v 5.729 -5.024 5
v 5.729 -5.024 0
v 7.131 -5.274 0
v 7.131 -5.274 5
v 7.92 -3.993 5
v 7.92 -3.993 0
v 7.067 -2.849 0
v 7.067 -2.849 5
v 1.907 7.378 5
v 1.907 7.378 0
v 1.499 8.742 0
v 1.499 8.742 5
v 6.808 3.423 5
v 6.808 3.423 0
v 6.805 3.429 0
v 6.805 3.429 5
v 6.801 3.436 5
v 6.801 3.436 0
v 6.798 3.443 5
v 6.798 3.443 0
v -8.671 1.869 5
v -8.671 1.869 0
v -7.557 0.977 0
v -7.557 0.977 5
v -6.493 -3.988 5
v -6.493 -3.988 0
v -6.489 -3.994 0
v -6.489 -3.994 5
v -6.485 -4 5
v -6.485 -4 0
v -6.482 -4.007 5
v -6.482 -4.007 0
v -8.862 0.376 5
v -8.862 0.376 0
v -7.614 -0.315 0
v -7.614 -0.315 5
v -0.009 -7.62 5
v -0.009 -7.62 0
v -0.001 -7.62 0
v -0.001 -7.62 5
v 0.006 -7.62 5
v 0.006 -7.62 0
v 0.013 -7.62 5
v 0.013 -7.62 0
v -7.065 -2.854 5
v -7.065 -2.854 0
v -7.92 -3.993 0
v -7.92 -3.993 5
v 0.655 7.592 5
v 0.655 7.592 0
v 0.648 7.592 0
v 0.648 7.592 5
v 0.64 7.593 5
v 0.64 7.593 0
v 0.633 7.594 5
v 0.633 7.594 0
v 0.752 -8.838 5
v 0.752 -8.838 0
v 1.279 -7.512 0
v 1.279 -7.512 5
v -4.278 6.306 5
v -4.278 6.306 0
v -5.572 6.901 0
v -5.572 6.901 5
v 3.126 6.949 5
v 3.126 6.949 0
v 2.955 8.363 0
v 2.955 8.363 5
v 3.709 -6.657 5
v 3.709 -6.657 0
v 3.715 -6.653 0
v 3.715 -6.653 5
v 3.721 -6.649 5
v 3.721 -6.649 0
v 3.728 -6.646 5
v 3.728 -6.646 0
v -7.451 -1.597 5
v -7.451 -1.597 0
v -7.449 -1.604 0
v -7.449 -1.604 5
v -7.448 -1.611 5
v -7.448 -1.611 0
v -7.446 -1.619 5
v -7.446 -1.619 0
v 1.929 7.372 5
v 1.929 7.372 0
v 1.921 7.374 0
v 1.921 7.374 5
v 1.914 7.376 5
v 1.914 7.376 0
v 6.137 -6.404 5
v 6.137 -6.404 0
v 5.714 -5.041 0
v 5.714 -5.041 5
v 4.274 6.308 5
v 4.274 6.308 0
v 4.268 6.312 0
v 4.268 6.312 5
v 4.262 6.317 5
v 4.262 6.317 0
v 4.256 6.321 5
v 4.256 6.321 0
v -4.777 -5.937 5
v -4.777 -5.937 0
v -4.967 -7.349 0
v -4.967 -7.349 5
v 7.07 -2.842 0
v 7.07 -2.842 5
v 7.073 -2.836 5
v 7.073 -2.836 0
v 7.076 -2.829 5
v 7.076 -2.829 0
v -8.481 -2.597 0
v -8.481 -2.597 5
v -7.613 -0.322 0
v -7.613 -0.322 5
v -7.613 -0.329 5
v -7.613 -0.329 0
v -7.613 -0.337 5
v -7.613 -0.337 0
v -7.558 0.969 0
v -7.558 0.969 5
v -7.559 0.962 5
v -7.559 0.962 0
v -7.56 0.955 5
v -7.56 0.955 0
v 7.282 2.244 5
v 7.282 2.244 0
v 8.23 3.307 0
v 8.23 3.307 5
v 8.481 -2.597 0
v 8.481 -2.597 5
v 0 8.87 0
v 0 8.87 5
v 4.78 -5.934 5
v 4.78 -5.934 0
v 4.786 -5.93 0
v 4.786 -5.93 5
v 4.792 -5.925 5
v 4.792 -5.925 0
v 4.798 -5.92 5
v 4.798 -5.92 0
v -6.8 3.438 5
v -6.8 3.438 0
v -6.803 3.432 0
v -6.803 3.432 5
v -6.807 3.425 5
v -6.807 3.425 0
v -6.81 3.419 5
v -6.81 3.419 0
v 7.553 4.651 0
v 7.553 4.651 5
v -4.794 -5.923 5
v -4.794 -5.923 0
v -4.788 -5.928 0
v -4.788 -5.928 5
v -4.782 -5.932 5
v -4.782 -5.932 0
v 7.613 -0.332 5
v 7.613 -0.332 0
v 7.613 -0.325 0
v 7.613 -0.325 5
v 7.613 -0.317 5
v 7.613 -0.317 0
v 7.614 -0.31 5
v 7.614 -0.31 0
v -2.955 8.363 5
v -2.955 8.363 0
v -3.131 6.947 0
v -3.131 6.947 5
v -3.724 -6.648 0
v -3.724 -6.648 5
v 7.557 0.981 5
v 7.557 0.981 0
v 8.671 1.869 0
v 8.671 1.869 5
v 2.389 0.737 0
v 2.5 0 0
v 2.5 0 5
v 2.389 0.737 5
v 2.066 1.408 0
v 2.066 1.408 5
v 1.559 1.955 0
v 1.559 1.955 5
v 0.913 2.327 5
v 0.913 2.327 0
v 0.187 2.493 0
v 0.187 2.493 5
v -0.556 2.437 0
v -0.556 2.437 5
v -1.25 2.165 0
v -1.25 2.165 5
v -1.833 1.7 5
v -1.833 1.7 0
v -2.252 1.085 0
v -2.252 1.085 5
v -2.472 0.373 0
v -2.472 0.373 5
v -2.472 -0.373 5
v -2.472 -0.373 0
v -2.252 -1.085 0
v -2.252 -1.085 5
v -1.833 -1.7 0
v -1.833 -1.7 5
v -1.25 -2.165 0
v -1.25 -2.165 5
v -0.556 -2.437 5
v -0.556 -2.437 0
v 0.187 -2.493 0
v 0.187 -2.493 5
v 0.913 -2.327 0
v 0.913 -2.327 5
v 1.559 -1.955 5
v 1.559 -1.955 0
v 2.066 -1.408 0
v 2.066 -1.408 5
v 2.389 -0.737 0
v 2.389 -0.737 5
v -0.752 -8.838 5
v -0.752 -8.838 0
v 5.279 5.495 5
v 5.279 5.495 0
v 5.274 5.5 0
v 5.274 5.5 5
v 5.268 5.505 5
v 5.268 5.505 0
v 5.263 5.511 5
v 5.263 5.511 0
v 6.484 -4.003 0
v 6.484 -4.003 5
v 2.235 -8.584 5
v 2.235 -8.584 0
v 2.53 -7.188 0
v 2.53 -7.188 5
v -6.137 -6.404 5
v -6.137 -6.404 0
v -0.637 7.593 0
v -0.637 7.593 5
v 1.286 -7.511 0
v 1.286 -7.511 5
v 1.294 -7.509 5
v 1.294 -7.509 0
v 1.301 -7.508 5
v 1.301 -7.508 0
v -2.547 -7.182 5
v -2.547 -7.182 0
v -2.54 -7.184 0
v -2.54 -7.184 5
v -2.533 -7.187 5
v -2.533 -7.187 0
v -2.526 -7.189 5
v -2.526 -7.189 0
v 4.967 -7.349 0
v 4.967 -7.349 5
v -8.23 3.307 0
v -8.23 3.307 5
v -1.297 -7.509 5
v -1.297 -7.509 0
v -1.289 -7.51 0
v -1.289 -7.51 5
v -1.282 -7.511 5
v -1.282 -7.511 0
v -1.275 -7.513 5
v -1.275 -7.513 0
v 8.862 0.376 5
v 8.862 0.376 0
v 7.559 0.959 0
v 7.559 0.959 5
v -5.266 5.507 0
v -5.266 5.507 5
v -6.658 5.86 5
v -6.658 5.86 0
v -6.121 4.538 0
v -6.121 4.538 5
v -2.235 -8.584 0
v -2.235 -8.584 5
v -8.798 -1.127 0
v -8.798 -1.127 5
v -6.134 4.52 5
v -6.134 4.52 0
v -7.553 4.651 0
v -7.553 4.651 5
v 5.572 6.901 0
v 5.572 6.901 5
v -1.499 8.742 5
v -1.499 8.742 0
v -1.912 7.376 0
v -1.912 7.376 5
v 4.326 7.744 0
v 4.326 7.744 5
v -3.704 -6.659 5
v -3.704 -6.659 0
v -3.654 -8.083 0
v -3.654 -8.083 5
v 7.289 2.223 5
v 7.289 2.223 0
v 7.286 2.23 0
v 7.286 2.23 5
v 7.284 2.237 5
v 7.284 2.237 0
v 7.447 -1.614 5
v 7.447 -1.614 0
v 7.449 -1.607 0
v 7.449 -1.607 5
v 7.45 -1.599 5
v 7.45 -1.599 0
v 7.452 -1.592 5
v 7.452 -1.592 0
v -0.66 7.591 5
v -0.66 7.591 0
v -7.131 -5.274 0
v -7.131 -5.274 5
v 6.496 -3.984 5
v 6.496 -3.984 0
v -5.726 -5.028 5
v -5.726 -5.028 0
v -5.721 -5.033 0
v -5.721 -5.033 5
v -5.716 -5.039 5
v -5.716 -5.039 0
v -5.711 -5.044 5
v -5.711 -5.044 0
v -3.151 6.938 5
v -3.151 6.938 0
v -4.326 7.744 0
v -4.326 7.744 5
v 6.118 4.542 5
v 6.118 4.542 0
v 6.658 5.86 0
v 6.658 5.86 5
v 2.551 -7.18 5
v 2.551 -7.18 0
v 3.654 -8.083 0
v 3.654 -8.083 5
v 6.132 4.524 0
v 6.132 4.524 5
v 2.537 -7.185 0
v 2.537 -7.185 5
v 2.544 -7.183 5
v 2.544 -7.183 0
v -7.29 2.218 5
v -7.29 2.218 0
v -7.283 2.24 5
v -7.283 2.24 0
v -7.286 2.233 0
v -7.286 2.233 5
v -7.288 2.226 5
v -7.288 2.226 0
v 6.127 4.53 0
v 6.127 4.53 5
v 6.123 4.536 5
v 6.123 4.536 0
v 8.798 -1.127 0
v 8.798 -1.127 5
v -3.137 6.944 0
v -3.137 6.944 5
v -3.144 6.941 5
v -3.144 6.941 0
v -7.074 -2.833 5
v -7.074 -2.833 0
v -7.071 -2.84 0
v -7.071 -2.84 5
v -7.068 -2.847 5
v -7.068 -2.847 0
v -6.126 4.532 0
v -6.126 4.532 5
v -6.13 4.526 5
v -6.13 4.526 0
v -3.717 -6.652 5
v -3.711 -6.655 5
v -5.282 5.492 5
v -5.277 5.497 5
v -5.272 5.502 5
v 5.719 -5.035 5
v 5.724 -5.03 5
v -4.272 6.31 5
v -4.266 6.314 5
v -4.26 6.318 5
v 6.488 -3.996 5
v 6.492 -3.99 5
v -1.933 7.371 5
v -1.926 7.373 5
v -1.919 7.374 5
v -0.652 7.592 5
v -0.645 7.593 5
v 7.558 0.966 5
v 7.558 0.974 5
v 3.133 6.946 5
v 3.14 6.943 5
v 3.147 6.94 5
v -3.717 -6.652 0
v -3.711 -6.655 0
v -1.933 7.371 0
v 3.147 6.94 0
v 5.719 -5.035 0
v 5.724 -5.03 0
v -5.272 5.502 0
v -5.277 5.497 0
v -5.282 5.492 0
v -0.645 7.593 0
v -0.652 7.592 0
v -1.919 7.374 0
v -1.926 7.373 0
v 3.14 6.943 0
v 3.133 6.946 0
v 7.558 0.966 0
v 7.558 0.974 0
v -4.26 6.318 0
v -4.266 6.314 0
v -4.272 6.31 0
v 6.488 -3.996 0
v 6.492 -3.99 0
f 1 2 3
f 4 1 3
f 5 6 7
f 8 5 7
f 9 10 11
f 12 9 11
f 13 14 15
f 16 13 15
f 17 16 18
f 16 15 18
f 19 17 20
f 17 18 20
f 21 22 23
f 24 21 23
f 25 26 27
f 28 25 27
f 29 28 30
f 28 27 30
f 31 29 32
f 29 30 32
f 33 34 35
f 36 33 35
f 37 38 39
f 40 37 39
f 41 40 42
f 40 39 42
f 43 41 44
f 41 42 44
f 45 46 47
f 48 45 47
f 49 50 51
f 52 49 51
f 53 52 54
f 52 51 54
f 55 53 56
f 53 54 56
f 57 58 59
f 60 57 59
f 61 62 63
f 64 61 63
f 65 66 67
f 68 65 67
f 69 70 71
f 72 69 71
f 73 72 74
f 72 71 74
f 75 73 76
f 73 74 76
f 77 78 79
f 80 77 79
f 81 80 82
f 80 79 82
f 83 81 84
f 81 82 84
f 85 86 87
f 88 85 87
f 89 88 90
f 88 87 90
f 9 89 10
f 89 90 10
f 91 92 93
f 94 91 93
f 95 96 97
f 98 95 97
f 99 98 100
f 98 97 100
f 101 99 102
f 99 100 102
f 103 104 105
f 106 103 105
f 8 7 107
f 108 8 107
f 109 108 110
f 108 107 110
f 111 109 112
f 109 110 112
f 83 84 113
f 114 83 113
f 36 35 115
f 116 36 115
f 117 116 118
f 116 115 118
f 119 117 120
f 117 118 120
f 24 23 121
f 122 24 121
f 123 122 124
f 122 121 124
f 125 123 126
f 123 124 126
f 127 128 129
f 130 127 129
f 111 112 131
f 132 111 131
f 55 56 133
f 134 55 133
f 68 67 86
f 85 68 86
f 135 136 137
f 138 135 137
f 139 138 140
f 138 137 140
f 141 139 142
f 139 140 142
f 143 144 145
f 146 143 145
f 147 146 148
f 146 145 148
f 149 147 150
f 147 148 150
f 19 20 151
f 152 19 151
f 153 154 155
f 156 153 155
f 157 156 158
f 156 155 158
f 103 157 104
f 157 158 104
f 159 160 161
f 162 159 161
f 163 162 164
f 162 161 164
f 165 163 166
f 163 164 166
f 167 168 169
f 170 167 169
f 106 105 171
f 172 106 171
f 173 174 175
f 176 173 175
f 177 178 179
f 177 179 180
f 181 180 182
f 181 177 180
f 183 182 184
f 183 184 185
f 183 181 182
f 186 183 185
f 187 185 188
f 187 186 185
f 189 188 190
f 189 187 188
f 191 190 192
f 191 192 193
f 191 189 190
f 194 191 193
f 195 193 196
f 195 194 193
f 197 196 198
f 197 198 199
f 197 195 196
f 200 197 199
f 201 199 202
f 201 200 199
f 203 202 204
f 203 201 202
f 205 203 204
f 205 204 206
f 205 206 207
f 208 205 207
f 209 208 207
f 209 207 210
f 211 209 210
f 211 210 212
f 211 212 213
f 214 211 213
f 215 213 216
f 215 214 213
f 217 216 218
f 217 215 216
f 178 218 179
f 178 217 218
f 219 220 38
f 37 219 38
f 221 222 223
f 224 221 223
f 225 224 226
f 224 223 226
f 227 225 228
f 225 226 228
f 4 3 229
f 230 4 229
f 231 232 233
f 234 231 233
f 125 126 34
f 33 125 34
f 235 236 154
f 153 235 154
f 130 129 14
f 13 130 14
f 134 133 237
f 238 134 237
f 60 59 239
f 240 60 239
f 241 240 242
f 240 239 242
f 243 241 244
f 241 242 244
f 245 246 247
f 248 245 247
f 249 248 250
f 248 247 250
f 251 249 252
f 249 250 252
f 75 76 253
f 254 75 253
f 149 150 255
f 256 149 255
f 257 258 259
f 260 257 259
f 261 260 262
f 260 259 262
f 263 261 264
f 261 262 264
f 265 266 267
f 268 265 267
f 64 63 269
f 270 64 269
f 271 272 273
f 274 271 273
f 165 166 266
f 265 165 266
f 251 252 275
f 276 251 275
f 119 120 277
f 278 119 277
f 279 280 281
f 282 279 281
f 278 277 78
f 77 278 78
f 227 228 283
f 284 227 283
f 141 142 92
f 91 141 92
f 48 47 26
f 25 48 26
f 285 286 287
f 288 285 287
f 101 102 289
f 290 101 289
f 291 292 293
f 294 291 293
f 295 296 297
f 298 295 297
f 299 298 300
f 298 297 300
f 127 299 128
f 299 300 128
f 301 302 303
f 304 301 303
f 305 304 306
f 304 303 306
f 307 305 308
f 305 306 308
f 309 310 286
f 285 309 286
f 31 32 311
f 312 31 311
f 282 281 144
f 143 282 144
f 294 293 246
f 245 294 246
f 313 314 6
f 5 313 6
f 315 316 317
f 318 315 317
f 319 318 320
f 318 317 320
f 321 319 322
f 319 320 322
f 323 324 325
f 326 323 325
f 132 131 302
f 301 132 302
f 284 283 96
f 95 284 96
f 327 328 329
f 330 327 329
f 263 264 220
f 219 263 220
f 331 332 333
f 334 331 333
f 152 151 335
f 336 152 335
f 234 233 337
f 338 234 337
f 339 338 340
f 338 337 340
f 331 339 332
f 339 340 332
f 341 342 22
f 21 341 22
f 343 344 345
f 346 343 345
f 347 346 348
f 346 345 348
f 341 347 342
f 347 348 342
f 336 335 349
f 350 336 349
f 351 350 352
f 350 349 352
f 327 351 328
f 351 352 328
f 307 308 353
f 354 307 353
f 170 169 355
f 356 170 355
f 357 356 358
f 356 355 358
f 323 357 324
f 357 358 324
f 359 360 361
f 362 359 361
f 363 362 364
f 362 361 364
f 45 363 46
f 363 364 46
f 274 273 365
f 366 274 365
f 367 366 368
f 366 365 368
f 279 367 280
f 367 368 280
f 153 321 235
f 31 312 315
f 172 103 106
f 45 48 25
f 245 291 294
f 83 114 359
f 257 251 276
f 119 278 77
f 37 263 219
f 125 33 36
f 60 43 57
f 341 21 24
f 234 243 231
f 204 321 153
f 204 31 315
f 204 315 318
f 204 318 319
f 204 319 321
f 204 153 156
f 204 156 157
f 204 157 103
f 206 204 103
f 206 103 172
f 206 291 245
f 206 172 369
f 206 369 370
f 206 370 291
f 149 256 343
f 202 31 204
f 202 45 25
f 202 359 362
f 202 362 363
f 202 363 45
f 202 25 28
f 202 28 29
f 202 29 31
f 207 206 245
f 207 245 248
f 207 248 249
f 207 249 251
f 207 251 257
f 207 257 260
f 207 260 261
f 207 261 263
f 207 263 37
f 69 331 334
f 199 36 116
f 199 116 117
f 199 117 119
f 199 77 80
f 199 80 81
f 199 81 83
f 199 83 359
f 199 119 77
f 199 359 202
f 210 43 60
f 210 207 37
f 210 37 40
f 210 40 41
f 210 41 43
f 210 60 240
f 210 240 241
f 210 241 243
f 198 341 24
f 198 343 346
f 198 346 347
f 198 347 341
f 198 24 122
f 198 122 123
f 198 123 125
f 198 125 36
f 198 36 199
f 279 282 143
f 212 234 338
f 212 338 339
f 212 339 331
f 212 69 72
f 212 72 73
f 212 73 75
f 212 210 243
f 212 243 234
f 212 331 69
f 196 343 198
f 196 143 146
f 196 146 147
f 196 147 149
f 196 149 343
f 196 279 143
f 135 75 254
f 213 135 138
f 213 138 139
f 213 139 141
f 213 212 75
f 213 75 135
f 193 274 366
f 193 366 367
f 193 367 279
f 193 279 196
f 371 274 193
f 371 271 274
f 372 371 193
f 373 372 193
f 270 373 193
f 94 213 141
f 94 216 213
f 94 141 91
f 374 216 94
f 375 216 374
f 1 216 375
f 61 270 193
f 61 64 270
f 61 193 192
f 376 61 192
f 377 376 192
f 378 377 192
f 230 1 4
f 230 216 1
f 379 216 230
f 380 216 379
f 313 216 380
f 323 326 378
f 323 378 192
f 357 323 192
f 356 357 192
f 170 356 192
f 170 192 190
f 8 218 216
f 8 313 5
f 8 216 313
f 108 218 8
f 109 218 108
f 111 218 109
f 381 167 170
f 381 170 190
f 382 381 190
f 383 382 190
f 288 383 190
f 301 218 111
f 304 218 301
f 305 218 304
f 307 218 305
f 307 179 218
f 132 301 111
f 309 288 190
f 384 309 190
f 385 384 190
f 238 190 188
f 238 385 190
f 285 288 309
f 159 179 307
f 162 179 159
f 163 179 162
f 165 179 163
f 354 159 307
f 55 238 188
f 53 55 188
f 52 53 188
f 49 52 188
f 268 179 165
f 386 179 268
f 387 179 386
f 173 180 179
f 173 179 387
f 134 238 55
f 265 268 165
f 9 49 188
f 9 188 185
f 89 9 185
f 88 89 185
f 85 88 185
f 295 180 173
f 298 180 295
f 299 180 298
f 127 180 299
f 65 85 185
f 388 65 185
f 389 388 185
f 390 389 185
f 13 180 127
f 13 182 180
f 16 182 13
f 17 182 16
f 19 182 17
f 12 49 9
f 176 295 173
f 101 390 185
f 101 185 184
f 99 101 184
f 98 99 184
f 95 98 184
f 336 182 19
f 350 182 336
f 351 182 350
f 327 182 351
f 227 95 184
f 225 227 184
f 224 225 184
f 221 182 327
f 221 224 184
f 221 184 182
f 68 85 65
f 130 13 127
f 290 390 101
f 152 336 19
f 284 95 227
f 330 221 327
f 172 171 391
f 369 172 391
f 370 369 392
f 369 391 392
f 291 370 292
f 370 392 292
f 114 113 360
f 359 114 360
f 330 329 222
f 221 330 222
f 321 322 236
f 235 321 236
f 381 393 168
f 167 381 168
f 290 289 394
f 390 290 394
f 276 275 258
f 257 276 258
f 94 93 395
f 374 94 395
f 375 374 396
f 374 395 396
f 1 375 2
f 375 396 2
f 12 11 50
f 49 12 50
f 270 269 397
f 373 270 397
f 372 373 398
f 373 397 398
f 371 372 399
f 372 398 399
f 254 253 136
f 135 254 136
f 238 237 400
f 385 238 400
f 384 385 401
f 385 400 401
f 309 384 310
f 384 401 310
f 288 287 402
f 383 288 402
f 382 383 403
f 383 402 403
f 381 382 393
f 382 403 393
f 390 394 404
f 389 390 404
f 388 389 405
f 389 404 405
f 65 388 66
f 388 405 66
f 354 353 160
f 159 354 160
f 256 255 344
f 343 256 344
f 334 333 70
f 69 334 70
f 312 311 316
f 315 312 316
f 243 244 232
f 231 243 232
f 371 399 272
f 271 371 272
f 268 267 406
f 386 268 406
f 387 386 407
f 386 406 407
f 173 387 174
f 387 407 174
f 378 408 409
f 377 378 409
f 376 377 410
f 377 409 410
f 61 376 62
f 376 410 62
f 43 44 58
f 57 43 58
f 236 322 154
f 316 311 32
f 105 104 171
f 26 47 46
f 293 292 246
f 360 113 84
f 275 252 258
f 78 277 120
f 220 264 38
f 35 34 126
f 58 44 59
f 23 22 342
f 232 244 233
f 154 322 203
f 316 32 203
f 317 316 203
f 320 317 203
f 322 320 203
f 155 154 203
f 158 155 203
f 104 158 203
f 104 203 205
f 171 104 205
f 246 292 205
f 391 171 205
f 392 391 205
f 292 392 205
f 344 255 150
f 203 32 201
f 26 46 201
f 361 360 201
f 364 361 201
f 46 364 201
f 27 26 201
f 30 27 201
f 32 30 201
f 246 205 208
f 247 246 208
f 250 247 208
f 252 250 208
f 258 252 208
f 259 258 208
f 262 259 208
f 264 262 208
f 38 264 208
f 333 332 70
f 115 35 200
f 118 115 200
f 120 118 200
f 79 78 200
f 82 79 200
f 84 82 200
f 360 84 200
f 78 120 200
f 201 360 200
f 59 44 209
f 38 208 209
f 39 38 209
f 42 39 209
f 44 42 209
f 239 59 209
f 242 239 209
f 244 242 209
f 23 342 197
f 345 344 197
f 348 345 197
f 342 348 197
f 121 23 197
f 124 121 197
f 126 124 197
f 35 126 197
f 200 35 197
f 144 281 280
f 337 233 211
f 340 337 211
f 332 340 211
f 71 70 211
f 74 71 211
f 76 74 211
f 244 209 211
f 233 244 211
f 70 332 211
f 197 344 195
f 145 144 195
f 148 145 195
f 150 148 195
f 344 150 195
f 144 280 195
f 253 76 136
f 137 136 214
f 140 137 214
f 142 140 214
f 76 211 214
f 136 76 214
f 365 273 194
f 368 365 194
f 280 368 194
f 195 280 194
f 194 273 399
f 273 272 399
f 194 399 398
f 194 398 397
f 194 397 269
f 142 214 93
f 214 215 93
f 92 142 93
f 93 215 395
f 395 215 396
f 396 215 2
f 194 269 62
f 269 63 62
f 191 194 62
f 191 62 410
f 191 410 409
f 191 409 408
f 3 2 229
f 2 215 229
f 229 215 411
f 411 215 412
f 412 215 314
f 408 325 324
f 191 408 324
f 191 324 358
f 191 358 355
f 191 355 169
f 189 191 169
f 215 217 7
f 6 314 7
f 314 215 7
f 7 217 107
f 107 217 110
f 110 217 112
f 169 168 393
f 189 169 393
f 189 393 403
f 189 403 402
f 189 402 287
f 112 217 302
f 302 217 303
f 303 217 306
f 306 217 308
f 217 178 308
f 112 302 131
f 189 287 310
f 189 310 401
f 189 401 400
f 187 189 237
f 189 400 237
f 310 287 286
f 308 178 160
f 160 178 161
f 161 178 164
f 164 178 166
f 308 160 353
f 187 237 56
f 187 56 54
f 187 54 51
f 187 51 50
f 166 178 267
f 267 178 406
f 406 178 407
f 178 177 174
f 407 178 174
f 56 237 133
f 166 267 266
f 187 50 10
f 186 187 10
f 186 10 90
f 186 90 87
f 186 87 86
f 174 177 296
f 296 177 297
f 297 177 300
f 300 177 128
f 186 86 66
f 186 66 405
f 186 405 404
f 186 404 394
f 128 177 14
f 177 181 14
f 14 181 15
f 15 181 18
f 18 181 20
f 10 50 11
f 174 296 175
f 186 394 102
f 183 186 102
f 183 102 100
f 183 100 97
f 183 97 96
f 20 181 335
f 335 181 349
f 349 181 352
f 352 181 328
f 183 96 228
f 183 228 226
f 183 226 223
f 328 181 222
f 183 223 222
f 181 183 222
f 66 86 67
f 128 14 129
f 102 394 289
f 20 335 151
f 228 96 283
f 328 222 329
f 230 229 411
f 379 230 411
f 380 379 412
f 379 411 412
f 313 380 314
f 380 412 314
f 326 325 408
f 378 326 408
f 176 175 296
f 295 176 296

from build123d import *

# Parameters (mm, degrees)
F0_R     = 2.5
F1_DEPTH = 5


# Not quite as in the source:
# - a feature names something its author has since deleted; it is built from what else it names


with BuildPart() as f1:
    # F0 (on Top) → F1 (new body)
    with BuildSketch(Plane.XY):
        with BuildLine():
            ThreePointArc((0.6328035034, 7.5936789322), (-0.0023111215, 7.6199996495), (-0.6374096636, 7.5932936807))
            ThreePointArc((-0.6374096636, 7.5932936807), (-0.6485239105, 7.5923525167), (-0.6596367677, 7.5913950849))
            ThreePointArc((-0.6596367677, 7.5913950849), (-1.2900640698, 7.51000231), (-1.9115139669, 7.3763483076))
            ThreePointArc((-1.9115139669, 7.3763483076), (-1.9223092879, 7.3735423645), (-1.9331004901, 7.3707206225))
            ThreePointArc((-1.9331004901, 7.3707206225), (-2.5407042235, 7.1839558774), (-3.1306274935, 6.9471988237))
            ThreePointArc((-3.1306274935, 6.9471988237), (-3.140793327, 6.9426088236), (-3.1509524309, 6.9380039477))
            ThreePointArc((-3.1509524309, 6.9380039477), (-3.7182529426, 6.651240114), (-4.2596785672, 6.3181910785))
            ThreePointArc((-4.2596785672, 6.3181910785), (-4.2689224606, 6.3119490671), (-4.2781572072, 6.3056935313))
            ThreePointArc((-4.2781572072, 6.3056935313), (-4.7888342944, 5.9271802825), (-5.266186444, 5.5074204794))
            ThreePointArc((-5.266186444, 5.5074204794), (-5.2742424674, 5.4997060281), (-5.2822871898, 5.4919797928))
            ThreePointArc((-5.2822871898, 5.4919797928), (-5.7216496025, 5.0326062658), (-6.1211957249, 4.5382114205))
            ThreePointArc((-6.1211957249, 4.5382114205), (-6.1278321211, 4.52924646), (-6.1344553875, 4.5202717948))
            ThreePointArc((-6.1344553875, 4.5202717948), (-6.4898634689, 3.9932533296), (-6.8001093497, 3.4384462817))
            ThreePointArc((-6.8001093497, 3.4384462817), (-6.8051352017, 3.4284887176), (-6.8101464726, 3.4185238073))
            ThreePointArc((-6.8101464726, 3.4185238073), (-7.0713757794, 2.8390217657), (-7.2833962094, 2.2397633037))
            ThreePointArc((-7.2833962094, 2.2397633037), (-7.2866669326, 2.229099597), (-7.289922043, 2.218431114))
            ThreePointArc((-7.289922043, 2.218431114), (-7.4494574836, 1.6031167146), (-7.557153021, 0.9766464135))
            ThreePointArc((-7.557153021, 0.9766464135), (-7.5585745227, 0.9655833395), (-7.5599798288, 0.9545181966))
            ThreePointArc((-7.5599798288, 0.9545181966), (-7.6132318591, 0.3210929144), (-7.6135042995, -0.314566816))
            ThreePointArc((-7.6135042995, -0.314566816), (-7.6130356855, -0.3257109926), (-7.6125507594, -0.3368544714))
            ThreePointArc((-7.6125507594, -0.3368544714), (-7.5579874154, -0.9701681444), (-7.4508289211, -1.5967305308))
            ThreePointArc((-7.4508289211, -1.5967305308), (-7.4484836728, -1.6076352125), (-7.4461224648, -1.6185364495))
            ThreePointArc((-7.4461224648, -1.6185364495), (-7.2853134346, -2.233519232), (-7.0738067604, -2.8329592155))
            ThreePointArc((-7.0738067604, -2.8329592155), (-7.0696523462, -2.8433106943), (-7.0654827841, -2.8536560809))
            ThreePointArc((-7.0654827841, -2.8536560809), (-6.8030542506, -3.4326160379), (-6.4932840584, -3.9876888214))
            ThreePointArc((-6.4932840584, -3.9876888214), (-6.4874399932, -3.9971893043), (-6.4815820277, -4.0066812225))
            ThreePointArc((-6.4815820277, -4.0066812225), (-6.1250835821, -4.5329627301), (-5.7259613964, -5.0276998804))
            ThreePointArc((-5.7259613964, -5.0276998804), (-5.7185958034, -5.0360760556), (-5.7112179573, -5.0444414402))
            ThreePointArc((-5.7112179573, -5.0444414402), (-5.2709054108, -5.5029043377), (-4.7939132502, -5.9230731677))
            ThreePointArc((-4.7939132502, -5.9230731677), (-4.785238024, -5.930084068), (-4.7765525447, -5.9370822621))
            ThreePointArc((-4.7765525447, -5.9370822621), (-4.2650928876, -6.3145374066), (-3.7239529481, -6.648050424))
            ThreePointArc((-3.7239529481, -6.648050424), (-3.7142176592, -6.6534943586), (-3.7044744121, -6.658924037))
            ThreePointArc((-3.7044744121, -6.658924037), (-3.1365814075, -6.9445127312), (-2.5468612998, -7.1817753738))
            ThreePointArc((-2.5468612998, -7.1817753738), (-2.5363460148, -7.1854957305), (-2.5258252953, -7.1892006911))
            ThreePointArc((-2.5258252953, -7.1892006911), (-1.917836191, -7.3747070684), (-1.296501089, -7.5088937219))
            ThreePointArc((-1.296501089, -7.5088937219), (-1.2855083135, -7.5107834728), (-1.2745127836, -7.5126571308))
            ThreePointArc((-1.2745127836, -7.5126571308), (-0.6439183191, -7.5927445103), (-0.0088429024, -7.619994869))
            ThreePointArc((-0.0088429024, -7.619994869), (0.0023111215, -7.6199996495), (0.0134651405, -7.619988103))
            ThreePointArc((0.0134651405, -7.619988103), (0.6485239105, -7.5923525167), (1.2790696784, -7.5118826374))
            ThreePointArc((1.2790696784, -7.5118826374), (1.2900640698, -7.51000231), (1.3010556969, -7.5081058912))
            ThreePointArc((1.3010556969, -7.5081058912), (1.9223092879, -7.3735423645), (2.5301857534, -7.1876672192))
            ThreePointArc((2.5301857534, -7.1876672192), (2.5407042235, -7.1839558774), (2.5512172498, -7.1802291429))
            ThreePointArc((2.5512172498, -7.1802291429), (3.140793327, -6.9426088236), (3.7085129909, -6.6566757016))
            ThreePointArc((3.7085129909, -6.6566757016), (3.7182529426, -6.651240114), (3.7279849274, -6.6457902751))
            ThreePointArc((3.7279849274, -6.6457902751), (4.2689224606, -6.3119490671), (4.7801530617, -5.9341837439))
            ThreePointArc((4.7801530617, -5.9341837439), (4.7888342944, -5.9271802825), (4.7975052662, -5.9201641211))
            ThreePointArc((4.7975052662, -5.9201641211), (5.2742424674, -5.4997060281), (5.7142768322, -5.0409761242))
            ThreePointArc((5.7142768322, -5.0409761242), (5.7216496025, -5.0326062658), (5.7290101132, -5.0242256241))
            ThreePointArc((5.7290101132, -5.0242256241), (6.1278321211, -4.52924646), (6.4840112622, -4.0027487995))
            ThreePointArc((6.4840112622, -4.0027487995), (6.4898634689, -3.9932533296), (6.4957017701, -3.9837493036))
            ThreePointArc((6.4957017701, -3.9837493036), (6.8051352017, -3.4284887176), (7.0672124935, -2.8493696796))
            ThreePointArc((7.0672124935, -2.8493696796), (7.0713757794, -2.8390217657), (7.0755239138, -2.8286677687))
            ThreePointArc((7.0755239138, -2.8286677687), (7.2866669326, -2.229099597), (7.4471028887, -1.6140193819))
            ThreePointArc((7.4471028887, -1.6140193819), (7.4494574836, -1.6031167146), (7.4517961168, -1.5922106123))
            ThreePointArc((7.4517961168, -1.5922106123), (7.5585745227, -0.9655833395), (7.6127536927, -0.3322366852))
            ThreePointArc((7.6127536927, -0.3322366852), (7.6132318591, -0.3210929144), (7.613693713, -0.3099484555))
            ThreePointArc((7.613693713, -0.3099484555), (7.6184232651, -0.1550063017), (7.62, 0))
            ThreePointArc((7.62, 0), (7.6048347675, 0.4805082297), (7.5593994334, 0.959103856))
            ThreePointArc((7.5593994334, 0.959103856), (7.5579874154, 0.9701681444), (7.5565592033, 0.981230354))
            ThreePointArc((7.5565592033, 0.981230354), (7.4484836728, 1.6076352125), (7.2885750158, 2.2228527255))
            ThreePointArc((7.2885750158, 2.2228527255), (7.2853134346, 2.233519232), (7.2820362435, 2.2441809528))
            ThreePointArc((7.2820362435, 2.2441809528), (7.0696523462, 2.8433106943), (6.8080715652, 3.4226541693))
            ThreePointArc((6.8080715652, 3.4226541693), (6.8030542506, 3.4326160379), (6.7980223593, 3.4425705516))
            ThreePointArc((6.7980223593, 3.4425705516), (6.4874399932, 3.9971893043), (6.1317122912, 4.5239920842))
            ThreePointArc((6.1317122912, 4.5239920842), (6.1250835821, 4.5329627301), (6.118441749, 4.5419236634))
            ThreePointArc((6.118441749, 4.5419236634), (5.7185958034, 5.0360760556), (5.2789548185, 5.4951829837))
            ThreePointArc((5.2789548185, 5.4951829837), (5.2709054108, 5.5029043377), (5.2628447094, 5.5106139009))
            ThreePointArc((5.2628447094, 5.5106139009), (4.785238024, 5.930084068), (4.2743314271, 6.3082874738))
            ThreePointArc((4.2743314271, 6.3082874738), (4.2650928876, 6.3145374066), (4.2558452095, 6.3207738096))
            ThreePointArc((4.2558452095, 6.3207738096), (3.7142176592, 6.6534943586), (3.1467433027, 6.9399140187))
            ThreePointArc((3.1467433027, 6.9399140187), (3.1365814075, 6.9445127312), (3.1264127916, 6.9490965641))
            ThreePointArc((3.1264127916, 6.9490965641), (2.5363460148, 7.1854957305), (1.9286291028, 7.3718918728))
            ThreePointArc((1.9286291028, 7.3718918728), (1.917836191, 7.3747070684), (1.9070391699, 7.3775064625))
            ThreePointArc((1.9070391699, 7.3775064625), (1.2855083135, 7.5107834728), (0.6550317551, 7.5917938196))
            ThreePointArc((0.6550317551, 7.5917938196), (0.6439183191, 7.5927445103), (0.6328035034, 7.5936789322))
        make_face()
        Circle(F0_R, mode=Mode.SUBTRACT)
        with BuildLine():
            ThreePointArc((-6.1211957249, 4.5382114205), (-5.7216496025, 5.0326062658), (-5.2822871898, 5.4919797928))
            Line((-5.2822871898, 5.4919797928), (-6.6584633476, 5.8601847965))
            Line((-6.6584633476, 5.8601847965), (-6.1211957249, 4.5382114205))
        make_face()
        with BuildLine():
            ThreePointArc((-5.266186444, 5.5074204794), (-4.7888342944, 5.9271802825), (-4.2781572072, 6.3056935313))
            Line((-4.2781572072, 6.3056935313), (-5.572311376, 6.9011771408))
            Line((-5.572311376, 6.9011771408), (-5.266186444, 5.5074204794))
        make_face()
        with BuildLine():
            ThreePointArc((-4.2596785672, 6.3181910785), (-3.7182529426, 6.651240114), (-3.1509524309, 6.9380039477))
            Line((-3.1509524309, 6.9380039477), (-4.3258541516, 7.7436351837))
            Line((-4.3258541516, 7.7436351837), (-4.2596785672, 6.3181910785))
        make_face()
        with BuildLine():
            ThreePointArc((-3.1306274935, 6.9471988237), (-2.5407042235, 7.1839558774), (-1.9331004901, 7.3707206225))
            Line((-1.9331004901, 7.3707206225), (-2.9549499794, 8.3633229412))
            Line((-2.9549499794, 8.3633229412), (-3.1306274935, 6.9471988237))
        make_face()
        with BuildLine():
            ThreePointArc((-1.9115139669, 7.3763483076), (-1.2900640698, 7.51000231), (-0.6596367677, 7.5913950849))
            Line((-0.6596367677, 7.5913950849), (-1.4990372763, 8.7424131248))
            Line((-1.4990372763, 8.7424131248), (-1.9115139669, 7.3763483076))
        make_face()
        with BuildLine():
            Line((1.4990372763, 8.7424131248), (0.6550317551, 7.5917938196))
            ThreePointArc((0.6550317551, 7.5917938196), (1.2855083135, 7.5107834728), (1.9070391699, 7.3775064625))
            Line((1.9070391699, 7.3775064625), (1.4990372763, 8.7424131248))
        make_face()
        with BuildLine():
            Line((2.9549499794, 8.3633229412), (1.9286291028, 7.3718918728))
            ThreePointArc((1.9286291028, 7.3718918728), (2.5363460148, 7.1854957305), (3.1264127916, 6.9490965641))
            Line((3.1264127916, 6.9490965641), (2.9549499794, 8.3633229412))
        make_face()
        with BuildLine():
            Line((4.3258541516, 7.7436351837), (3.1467433027, 6.9399140187))
            ThreePointArc((3.1467433027, 6.9399140187), (3.7142176592, 6.6534943586), (4.2558452095, 6.3207738096))
            Line((4.2558452095, 6.3207738096), (4.3258541516, 7.7436351837))
        make_face()
        with BuildLine():
            Line((5.572311376, 6.9011771408), (4.2743314271, 6.3082874738))
            ThreePointArc((4.2743314271, 6.3082874738), (4.785238024, 5.930084068), (5.2628447094, 5.5106139009))
            Line((5.2628447094, 5.5106139009), (5.572311376, 6.9011771408))
        make_face()
        with BuildLine():
            Line((6.6584633476, 5.8601847965), (5.2789548185, 5.4951829837))
            ThreePointArc((5.2789548185, 5.4951829837), (5.7185958034, 5.0360760556), (6.118441749, 4.5419236634))
            Line((6.118441749, 4.5419236634), (6.6584633476, 5.8601847965))
        make_face()
        with BuildLine():
            Line((7.5530634517, 4.6506056052), (6.1317122912, 4.5239920842))
            ThreePointArc((6.1317122912, 4.5239920842), (6.4874399932, 3.9971893043), (6.7980223593, 3.4425705516))
            Line((6.7980223593, 3.4425705516), (7.5530634517, 4.6506056052))
        make_face()
        with BuildLine():
            Line((8.2303756721, 3.3072369579), (6.8080715652, 3.4226541693))
            ThreePointArc((6.8080715652, 3.4226541693), (7.0696523462, 2.8433106943), (7.2820362435, 2.2441809528))
            Line((7.2820362435, 2.2441809528), (8.2303756721, 3.3072369579))
        make_face()
        with BuildLine():
            Line((8.6709149695, 1.8687251249), (7.2885750158, 2.2228527255))
            ThreePointArc((7.2885750158, 2.2228527255), (7.4484836728, 1.6076352125), (7.5565592033, 0.981230354))
            Line((7.5565592033, 0.981230354), (8.6709149695, 1.8687251249))
        make_face()
        with BuildLine():
            Line((8.8620078302, 0.3764534723), (7.5593994334, 0.959103856))
            ThreePointArc((7.5593994334, 0.959103856), (7.6048347675, 0.4805082297), (7.62, 0))
            ThreePointArc((7.62, 0), (7.6184232651, -0.1550063017), (7.613693713, -0.3099484555))
            Line((7.613693713, -0.3099484555), (8.8620078302, 0.3764534723))
        make_face()
        with BuildLine():
            Line((8.7981568607, -1.1266480612), (7.6127536927, -0.3322366852))
            ThreePointArc((7.6127536927, -0.3322366852), (7.5585745227, -0.9655833395), (7.4517961168, -1.5922106123))
            Line((7.4517961168, -1.5922106123), (8.7981568607, -1.1266480612))
        make_face()
        with BuildLine():
            Line((8.4811989371, -2.5973379812), (7.4471028887, -1.6140193819))
            ThreePointArc((7.4471028887, -1.6140193819), (7.2866669326, -2.229099597), (7.0755239138, -2.8286677687))
            Line((7.0755239138, -2.8286677687), (8.4811989371, -2.5973379812))
        make_face()
        with BuildLine():
            Line((7.9202523618, -3.9933072165), (7.0672124935, -2.8493696796))
            ThreePointArc((7.0672124935, -2.8493696796), (6.8051352017, -3.4284887176), (6.4957017701, -3.9837493036))
            Line((6.4957017701, -3.9837493036), (7.9202523618, -3.9933072165))
        make_face()
        with BuildLine():
            Line((7.1314545464, -5.2743962738), (6.4840112622, -4.0027487995))
            ThreePointArc((6.4840112622, -4.0027487995), (6.1278321211, -4.52924646), (5.7290101132, -5.0242256241))
            Line((5.7290101132, -5.0242256241), (7.1314545464, -5.2743962738))
        make_face()
        with BuildLine():
            Line((6.1374977678, -6.4037505534), (5.7142768322, -5.0409761242))
            ThreePointArc((5.7142768322, -5.0409761242), (5.2742424674, -5.4997060281), (4.7975052662, -5.9201641211))
            Line((4.7975052662, -5.9201641211), (6.1374977678, -6.4037505534))
        make_face()
        with BuildLine():
            Line((4.966976353, -7.3488805888), (4.7801530617, -5.9341837439))
            ThreePointArc((4.7801530617, -5.9341837439), (4.2689224606, -6.3119490671), (3.7279849274, -6.6457902751))
            Line((3.7279849274, -6.6457902751), (4.966976353, -7.3488805888))
        make_face()
        with BuildLine():
            Line((3.6535640719, -8.0825967097), (3.7085129909, -6.6566757016))
            ThreePointArc((3.7085129909, -6.6566757016), (3.140793327, -6.9426088236), (2.5512172498, -7.1802291429))
            Line((2.5512172498, -7.1802291429), (3.6535640719, -8.0825967097))
        make_face()
        with BuildLine():
            Line((2.2350454045, -8.5837912393), (2.5301857534, -7.1876672192))
            ThreePointArc((2.5301857534, -7.1876672192), (1.9223092879, -7.3735423645), (1.3010556969, -7.5081058912))
            Line((1.3010556969, -7.5081058912), (2.2350454045, -8.5837912393))
        make_face()
        with BuildLine():
            Line((0.7522285501, -8.8380457234), (1.2790696784, -7.5118826374))
            ThreePointArc((1.2790696784, -7.5118826374), (0.6485239105, -7.5923525167), (0.0134651405, -7.619988103))
            Line((0.0134651405, -7.619988103), (0.7522285501, -8.8380457234))
        make_face()
        with BuildLine():
            ThreePointArc((-0.0088429024, -7.619994869), (-0.6439183191, -7.5927445103), (-1.2745127836, -7.5126571308))
            Line((-1.2745127836, -7.5126571308), (-0.7522285501, -8.8380457234))
            Line((-0.7522285501, -8.8380457234), (-0.0088429024, -7.619994869))
        make_face()
        with BuildLine():
            ThreePointArc((-1.296501089, -7.5088937219), (-1.917836191, -7.3747070684), (-2.5258252953, -7.1892006911))
            Line((-2.5258252953, -7.1892006911), (-2.2350454045, -8.5837912393))
            Line((-2.2350454045, -8.5837912393), (-1.296501089, -7.5088937219))
        make_face()
        with BuildLine():
            ThreePointArc((-2.5468612998, -7.1817753738), (-3.1365814075, -6.9445127312), (-3.7044744121, -6.658924037))
            Line((-3.7044744121, -6.658924037), (-3.6535640719, -8.0825967097))
            Line((-3.6535640719, -8.0825967097), (-2.5468612998, -7.1817753738))
        make_face()
        with BuildLine():
            ThreePointArc((-3.7239529481, -6.648050424), (-4.2650928876, -6.3145374066), (-4.7765525447, -5.9370822621))
            Line((-4.7765525447, -5.9370822621), (-4.966976353, -7.3488805888))
            Line((-4.966976353, -7.3488805888), (-3.7239529481, -6.648050424))
        make_face()
        with BuildLine():
            ThreePointArc((-4.7939132502, -5.9230731677), (-5.2709054108, -5.5029043377), (-5.7112179573, -5.0444414402))
            Line((-5.7112179573, -5.0444414402), (-6.1374977678, -6.4037505534))
            Line((-6.1374977678, -6.4037505534), (-4.7939132502, -5.9230731677))
        make_face()
        with BuildLine():
            ThreePointArc((-5.7259613964, -5.0276998804), (-6.1250835821, -4.5329627301), (-6.4815820277, -4.0066812225))
            Line((-6.4815820277, -4.0066812225), (-7.1314545464, -5.2743962738))
            Line((-7.1314545464, -5.2743962738), (-5.7259613964, -5.0276998804))
        make_face()
        with BuildLine():
            ThreePointArc((-6.4932840584, -3.9876888214), (-6.8030542506, -3.4326160379), (-7.0654827841, -2.8536560809))
            Line((-7.0654827841, -2.8536560809), (-7.9202523618, -3.9933072165))
            Line((-7.9202523618, -3.9933072165), (-6.4932840584, -3.9876888214))
        make_face()
        with BuildLine():
            ThreePointArc((-7.0738067604, -2.8329592155), (-7.2853134346, -2.233519232), (-7.4461224648, -1.6185364495))
            Line((-7.4461224648, -1.6185364495), (-8.4811989371, -2.5973379812))
            Line((-8.4811989371, -2.5973379812), (-7.0738067604, -2.8329592155))
        make_face()
        with BuildLine():
            ThreePointArc((-7.4508289211, -1.5967305308), (-7.5579874154, -0.9701681444), (-7.6125507594, -0.3368544714))
            Line((-7.6125507594, -0.3368544714), (-8.7981568607, -1.1266480612))
            Line((-8.7981568607, -1.1266480612), (-7.4508289211, -1.5967305308))
        make_face()
        with BuildLine():
            ThreePointArc((-7.6135042995, -0.314566816), (-7.6132318591, 0.3210929144), (-7.5599798288, 0.9545181966))
            Line((-7.5599798288, 0.9545181966), (-8.8620078302, 0.3764534723))
            Line((-8.8620078302, 0.3764534723), (-7.6135042995, -0.314566816))
        make_face()
        with BuildLine():
            ThreePointArc((-7.557153021, 0.9766464135), (-7.4494574836, 1.6031167146), (-7.289922043, 2.218431114))
            Line((-7.289922043, 2.218431114), (-8.6709149695, 1.8687251249))
            Line((-8.6709149695, 1.8687251249), (-7.557153021, 0.9766464135))
        make_face()
        with BuildLine():
            ThreePointArc((-7.2833962094, 2.2397633037), (-7.0713757794, 2.8390217657), (-6.8101464726, 3.4185238073))
            Line((-6.8101464726, 3.4185238073), (-8.2303756721, 3.3072369579))
            Line((-8.2303756721, 3.3072369579), (-7.2833962094, 2.2397633037))
        make_face()
        with BuildLine():
            ThreePointArc((-6.8001093497, 3.4384462817), (-6.4898634689, 3.9932533296), (-6.1344553875, 4.5202717948))
            Line((-6.1344553875, 4.5202717948), (-7.5530634517, 4.6506056052))
            Line((-7.5530634517, 4.6506056052), (-6.8001093497, 3.4384462817))
        make_face()
        with BuildLine():
            Line((0.6328035034, 7.5936789322), (0, 8.87))
            Line((0, 8.87), (-0.6374096636, 7.5932936807))
            ThreePointArc((-0.6374096636, 7.5932936807), (-0.0023111215, 7.6199996495), (0.6328035034, 7.5936789322))
        make_face()
    extrude(amount=F1_DEPTH)


solid = f1.part
